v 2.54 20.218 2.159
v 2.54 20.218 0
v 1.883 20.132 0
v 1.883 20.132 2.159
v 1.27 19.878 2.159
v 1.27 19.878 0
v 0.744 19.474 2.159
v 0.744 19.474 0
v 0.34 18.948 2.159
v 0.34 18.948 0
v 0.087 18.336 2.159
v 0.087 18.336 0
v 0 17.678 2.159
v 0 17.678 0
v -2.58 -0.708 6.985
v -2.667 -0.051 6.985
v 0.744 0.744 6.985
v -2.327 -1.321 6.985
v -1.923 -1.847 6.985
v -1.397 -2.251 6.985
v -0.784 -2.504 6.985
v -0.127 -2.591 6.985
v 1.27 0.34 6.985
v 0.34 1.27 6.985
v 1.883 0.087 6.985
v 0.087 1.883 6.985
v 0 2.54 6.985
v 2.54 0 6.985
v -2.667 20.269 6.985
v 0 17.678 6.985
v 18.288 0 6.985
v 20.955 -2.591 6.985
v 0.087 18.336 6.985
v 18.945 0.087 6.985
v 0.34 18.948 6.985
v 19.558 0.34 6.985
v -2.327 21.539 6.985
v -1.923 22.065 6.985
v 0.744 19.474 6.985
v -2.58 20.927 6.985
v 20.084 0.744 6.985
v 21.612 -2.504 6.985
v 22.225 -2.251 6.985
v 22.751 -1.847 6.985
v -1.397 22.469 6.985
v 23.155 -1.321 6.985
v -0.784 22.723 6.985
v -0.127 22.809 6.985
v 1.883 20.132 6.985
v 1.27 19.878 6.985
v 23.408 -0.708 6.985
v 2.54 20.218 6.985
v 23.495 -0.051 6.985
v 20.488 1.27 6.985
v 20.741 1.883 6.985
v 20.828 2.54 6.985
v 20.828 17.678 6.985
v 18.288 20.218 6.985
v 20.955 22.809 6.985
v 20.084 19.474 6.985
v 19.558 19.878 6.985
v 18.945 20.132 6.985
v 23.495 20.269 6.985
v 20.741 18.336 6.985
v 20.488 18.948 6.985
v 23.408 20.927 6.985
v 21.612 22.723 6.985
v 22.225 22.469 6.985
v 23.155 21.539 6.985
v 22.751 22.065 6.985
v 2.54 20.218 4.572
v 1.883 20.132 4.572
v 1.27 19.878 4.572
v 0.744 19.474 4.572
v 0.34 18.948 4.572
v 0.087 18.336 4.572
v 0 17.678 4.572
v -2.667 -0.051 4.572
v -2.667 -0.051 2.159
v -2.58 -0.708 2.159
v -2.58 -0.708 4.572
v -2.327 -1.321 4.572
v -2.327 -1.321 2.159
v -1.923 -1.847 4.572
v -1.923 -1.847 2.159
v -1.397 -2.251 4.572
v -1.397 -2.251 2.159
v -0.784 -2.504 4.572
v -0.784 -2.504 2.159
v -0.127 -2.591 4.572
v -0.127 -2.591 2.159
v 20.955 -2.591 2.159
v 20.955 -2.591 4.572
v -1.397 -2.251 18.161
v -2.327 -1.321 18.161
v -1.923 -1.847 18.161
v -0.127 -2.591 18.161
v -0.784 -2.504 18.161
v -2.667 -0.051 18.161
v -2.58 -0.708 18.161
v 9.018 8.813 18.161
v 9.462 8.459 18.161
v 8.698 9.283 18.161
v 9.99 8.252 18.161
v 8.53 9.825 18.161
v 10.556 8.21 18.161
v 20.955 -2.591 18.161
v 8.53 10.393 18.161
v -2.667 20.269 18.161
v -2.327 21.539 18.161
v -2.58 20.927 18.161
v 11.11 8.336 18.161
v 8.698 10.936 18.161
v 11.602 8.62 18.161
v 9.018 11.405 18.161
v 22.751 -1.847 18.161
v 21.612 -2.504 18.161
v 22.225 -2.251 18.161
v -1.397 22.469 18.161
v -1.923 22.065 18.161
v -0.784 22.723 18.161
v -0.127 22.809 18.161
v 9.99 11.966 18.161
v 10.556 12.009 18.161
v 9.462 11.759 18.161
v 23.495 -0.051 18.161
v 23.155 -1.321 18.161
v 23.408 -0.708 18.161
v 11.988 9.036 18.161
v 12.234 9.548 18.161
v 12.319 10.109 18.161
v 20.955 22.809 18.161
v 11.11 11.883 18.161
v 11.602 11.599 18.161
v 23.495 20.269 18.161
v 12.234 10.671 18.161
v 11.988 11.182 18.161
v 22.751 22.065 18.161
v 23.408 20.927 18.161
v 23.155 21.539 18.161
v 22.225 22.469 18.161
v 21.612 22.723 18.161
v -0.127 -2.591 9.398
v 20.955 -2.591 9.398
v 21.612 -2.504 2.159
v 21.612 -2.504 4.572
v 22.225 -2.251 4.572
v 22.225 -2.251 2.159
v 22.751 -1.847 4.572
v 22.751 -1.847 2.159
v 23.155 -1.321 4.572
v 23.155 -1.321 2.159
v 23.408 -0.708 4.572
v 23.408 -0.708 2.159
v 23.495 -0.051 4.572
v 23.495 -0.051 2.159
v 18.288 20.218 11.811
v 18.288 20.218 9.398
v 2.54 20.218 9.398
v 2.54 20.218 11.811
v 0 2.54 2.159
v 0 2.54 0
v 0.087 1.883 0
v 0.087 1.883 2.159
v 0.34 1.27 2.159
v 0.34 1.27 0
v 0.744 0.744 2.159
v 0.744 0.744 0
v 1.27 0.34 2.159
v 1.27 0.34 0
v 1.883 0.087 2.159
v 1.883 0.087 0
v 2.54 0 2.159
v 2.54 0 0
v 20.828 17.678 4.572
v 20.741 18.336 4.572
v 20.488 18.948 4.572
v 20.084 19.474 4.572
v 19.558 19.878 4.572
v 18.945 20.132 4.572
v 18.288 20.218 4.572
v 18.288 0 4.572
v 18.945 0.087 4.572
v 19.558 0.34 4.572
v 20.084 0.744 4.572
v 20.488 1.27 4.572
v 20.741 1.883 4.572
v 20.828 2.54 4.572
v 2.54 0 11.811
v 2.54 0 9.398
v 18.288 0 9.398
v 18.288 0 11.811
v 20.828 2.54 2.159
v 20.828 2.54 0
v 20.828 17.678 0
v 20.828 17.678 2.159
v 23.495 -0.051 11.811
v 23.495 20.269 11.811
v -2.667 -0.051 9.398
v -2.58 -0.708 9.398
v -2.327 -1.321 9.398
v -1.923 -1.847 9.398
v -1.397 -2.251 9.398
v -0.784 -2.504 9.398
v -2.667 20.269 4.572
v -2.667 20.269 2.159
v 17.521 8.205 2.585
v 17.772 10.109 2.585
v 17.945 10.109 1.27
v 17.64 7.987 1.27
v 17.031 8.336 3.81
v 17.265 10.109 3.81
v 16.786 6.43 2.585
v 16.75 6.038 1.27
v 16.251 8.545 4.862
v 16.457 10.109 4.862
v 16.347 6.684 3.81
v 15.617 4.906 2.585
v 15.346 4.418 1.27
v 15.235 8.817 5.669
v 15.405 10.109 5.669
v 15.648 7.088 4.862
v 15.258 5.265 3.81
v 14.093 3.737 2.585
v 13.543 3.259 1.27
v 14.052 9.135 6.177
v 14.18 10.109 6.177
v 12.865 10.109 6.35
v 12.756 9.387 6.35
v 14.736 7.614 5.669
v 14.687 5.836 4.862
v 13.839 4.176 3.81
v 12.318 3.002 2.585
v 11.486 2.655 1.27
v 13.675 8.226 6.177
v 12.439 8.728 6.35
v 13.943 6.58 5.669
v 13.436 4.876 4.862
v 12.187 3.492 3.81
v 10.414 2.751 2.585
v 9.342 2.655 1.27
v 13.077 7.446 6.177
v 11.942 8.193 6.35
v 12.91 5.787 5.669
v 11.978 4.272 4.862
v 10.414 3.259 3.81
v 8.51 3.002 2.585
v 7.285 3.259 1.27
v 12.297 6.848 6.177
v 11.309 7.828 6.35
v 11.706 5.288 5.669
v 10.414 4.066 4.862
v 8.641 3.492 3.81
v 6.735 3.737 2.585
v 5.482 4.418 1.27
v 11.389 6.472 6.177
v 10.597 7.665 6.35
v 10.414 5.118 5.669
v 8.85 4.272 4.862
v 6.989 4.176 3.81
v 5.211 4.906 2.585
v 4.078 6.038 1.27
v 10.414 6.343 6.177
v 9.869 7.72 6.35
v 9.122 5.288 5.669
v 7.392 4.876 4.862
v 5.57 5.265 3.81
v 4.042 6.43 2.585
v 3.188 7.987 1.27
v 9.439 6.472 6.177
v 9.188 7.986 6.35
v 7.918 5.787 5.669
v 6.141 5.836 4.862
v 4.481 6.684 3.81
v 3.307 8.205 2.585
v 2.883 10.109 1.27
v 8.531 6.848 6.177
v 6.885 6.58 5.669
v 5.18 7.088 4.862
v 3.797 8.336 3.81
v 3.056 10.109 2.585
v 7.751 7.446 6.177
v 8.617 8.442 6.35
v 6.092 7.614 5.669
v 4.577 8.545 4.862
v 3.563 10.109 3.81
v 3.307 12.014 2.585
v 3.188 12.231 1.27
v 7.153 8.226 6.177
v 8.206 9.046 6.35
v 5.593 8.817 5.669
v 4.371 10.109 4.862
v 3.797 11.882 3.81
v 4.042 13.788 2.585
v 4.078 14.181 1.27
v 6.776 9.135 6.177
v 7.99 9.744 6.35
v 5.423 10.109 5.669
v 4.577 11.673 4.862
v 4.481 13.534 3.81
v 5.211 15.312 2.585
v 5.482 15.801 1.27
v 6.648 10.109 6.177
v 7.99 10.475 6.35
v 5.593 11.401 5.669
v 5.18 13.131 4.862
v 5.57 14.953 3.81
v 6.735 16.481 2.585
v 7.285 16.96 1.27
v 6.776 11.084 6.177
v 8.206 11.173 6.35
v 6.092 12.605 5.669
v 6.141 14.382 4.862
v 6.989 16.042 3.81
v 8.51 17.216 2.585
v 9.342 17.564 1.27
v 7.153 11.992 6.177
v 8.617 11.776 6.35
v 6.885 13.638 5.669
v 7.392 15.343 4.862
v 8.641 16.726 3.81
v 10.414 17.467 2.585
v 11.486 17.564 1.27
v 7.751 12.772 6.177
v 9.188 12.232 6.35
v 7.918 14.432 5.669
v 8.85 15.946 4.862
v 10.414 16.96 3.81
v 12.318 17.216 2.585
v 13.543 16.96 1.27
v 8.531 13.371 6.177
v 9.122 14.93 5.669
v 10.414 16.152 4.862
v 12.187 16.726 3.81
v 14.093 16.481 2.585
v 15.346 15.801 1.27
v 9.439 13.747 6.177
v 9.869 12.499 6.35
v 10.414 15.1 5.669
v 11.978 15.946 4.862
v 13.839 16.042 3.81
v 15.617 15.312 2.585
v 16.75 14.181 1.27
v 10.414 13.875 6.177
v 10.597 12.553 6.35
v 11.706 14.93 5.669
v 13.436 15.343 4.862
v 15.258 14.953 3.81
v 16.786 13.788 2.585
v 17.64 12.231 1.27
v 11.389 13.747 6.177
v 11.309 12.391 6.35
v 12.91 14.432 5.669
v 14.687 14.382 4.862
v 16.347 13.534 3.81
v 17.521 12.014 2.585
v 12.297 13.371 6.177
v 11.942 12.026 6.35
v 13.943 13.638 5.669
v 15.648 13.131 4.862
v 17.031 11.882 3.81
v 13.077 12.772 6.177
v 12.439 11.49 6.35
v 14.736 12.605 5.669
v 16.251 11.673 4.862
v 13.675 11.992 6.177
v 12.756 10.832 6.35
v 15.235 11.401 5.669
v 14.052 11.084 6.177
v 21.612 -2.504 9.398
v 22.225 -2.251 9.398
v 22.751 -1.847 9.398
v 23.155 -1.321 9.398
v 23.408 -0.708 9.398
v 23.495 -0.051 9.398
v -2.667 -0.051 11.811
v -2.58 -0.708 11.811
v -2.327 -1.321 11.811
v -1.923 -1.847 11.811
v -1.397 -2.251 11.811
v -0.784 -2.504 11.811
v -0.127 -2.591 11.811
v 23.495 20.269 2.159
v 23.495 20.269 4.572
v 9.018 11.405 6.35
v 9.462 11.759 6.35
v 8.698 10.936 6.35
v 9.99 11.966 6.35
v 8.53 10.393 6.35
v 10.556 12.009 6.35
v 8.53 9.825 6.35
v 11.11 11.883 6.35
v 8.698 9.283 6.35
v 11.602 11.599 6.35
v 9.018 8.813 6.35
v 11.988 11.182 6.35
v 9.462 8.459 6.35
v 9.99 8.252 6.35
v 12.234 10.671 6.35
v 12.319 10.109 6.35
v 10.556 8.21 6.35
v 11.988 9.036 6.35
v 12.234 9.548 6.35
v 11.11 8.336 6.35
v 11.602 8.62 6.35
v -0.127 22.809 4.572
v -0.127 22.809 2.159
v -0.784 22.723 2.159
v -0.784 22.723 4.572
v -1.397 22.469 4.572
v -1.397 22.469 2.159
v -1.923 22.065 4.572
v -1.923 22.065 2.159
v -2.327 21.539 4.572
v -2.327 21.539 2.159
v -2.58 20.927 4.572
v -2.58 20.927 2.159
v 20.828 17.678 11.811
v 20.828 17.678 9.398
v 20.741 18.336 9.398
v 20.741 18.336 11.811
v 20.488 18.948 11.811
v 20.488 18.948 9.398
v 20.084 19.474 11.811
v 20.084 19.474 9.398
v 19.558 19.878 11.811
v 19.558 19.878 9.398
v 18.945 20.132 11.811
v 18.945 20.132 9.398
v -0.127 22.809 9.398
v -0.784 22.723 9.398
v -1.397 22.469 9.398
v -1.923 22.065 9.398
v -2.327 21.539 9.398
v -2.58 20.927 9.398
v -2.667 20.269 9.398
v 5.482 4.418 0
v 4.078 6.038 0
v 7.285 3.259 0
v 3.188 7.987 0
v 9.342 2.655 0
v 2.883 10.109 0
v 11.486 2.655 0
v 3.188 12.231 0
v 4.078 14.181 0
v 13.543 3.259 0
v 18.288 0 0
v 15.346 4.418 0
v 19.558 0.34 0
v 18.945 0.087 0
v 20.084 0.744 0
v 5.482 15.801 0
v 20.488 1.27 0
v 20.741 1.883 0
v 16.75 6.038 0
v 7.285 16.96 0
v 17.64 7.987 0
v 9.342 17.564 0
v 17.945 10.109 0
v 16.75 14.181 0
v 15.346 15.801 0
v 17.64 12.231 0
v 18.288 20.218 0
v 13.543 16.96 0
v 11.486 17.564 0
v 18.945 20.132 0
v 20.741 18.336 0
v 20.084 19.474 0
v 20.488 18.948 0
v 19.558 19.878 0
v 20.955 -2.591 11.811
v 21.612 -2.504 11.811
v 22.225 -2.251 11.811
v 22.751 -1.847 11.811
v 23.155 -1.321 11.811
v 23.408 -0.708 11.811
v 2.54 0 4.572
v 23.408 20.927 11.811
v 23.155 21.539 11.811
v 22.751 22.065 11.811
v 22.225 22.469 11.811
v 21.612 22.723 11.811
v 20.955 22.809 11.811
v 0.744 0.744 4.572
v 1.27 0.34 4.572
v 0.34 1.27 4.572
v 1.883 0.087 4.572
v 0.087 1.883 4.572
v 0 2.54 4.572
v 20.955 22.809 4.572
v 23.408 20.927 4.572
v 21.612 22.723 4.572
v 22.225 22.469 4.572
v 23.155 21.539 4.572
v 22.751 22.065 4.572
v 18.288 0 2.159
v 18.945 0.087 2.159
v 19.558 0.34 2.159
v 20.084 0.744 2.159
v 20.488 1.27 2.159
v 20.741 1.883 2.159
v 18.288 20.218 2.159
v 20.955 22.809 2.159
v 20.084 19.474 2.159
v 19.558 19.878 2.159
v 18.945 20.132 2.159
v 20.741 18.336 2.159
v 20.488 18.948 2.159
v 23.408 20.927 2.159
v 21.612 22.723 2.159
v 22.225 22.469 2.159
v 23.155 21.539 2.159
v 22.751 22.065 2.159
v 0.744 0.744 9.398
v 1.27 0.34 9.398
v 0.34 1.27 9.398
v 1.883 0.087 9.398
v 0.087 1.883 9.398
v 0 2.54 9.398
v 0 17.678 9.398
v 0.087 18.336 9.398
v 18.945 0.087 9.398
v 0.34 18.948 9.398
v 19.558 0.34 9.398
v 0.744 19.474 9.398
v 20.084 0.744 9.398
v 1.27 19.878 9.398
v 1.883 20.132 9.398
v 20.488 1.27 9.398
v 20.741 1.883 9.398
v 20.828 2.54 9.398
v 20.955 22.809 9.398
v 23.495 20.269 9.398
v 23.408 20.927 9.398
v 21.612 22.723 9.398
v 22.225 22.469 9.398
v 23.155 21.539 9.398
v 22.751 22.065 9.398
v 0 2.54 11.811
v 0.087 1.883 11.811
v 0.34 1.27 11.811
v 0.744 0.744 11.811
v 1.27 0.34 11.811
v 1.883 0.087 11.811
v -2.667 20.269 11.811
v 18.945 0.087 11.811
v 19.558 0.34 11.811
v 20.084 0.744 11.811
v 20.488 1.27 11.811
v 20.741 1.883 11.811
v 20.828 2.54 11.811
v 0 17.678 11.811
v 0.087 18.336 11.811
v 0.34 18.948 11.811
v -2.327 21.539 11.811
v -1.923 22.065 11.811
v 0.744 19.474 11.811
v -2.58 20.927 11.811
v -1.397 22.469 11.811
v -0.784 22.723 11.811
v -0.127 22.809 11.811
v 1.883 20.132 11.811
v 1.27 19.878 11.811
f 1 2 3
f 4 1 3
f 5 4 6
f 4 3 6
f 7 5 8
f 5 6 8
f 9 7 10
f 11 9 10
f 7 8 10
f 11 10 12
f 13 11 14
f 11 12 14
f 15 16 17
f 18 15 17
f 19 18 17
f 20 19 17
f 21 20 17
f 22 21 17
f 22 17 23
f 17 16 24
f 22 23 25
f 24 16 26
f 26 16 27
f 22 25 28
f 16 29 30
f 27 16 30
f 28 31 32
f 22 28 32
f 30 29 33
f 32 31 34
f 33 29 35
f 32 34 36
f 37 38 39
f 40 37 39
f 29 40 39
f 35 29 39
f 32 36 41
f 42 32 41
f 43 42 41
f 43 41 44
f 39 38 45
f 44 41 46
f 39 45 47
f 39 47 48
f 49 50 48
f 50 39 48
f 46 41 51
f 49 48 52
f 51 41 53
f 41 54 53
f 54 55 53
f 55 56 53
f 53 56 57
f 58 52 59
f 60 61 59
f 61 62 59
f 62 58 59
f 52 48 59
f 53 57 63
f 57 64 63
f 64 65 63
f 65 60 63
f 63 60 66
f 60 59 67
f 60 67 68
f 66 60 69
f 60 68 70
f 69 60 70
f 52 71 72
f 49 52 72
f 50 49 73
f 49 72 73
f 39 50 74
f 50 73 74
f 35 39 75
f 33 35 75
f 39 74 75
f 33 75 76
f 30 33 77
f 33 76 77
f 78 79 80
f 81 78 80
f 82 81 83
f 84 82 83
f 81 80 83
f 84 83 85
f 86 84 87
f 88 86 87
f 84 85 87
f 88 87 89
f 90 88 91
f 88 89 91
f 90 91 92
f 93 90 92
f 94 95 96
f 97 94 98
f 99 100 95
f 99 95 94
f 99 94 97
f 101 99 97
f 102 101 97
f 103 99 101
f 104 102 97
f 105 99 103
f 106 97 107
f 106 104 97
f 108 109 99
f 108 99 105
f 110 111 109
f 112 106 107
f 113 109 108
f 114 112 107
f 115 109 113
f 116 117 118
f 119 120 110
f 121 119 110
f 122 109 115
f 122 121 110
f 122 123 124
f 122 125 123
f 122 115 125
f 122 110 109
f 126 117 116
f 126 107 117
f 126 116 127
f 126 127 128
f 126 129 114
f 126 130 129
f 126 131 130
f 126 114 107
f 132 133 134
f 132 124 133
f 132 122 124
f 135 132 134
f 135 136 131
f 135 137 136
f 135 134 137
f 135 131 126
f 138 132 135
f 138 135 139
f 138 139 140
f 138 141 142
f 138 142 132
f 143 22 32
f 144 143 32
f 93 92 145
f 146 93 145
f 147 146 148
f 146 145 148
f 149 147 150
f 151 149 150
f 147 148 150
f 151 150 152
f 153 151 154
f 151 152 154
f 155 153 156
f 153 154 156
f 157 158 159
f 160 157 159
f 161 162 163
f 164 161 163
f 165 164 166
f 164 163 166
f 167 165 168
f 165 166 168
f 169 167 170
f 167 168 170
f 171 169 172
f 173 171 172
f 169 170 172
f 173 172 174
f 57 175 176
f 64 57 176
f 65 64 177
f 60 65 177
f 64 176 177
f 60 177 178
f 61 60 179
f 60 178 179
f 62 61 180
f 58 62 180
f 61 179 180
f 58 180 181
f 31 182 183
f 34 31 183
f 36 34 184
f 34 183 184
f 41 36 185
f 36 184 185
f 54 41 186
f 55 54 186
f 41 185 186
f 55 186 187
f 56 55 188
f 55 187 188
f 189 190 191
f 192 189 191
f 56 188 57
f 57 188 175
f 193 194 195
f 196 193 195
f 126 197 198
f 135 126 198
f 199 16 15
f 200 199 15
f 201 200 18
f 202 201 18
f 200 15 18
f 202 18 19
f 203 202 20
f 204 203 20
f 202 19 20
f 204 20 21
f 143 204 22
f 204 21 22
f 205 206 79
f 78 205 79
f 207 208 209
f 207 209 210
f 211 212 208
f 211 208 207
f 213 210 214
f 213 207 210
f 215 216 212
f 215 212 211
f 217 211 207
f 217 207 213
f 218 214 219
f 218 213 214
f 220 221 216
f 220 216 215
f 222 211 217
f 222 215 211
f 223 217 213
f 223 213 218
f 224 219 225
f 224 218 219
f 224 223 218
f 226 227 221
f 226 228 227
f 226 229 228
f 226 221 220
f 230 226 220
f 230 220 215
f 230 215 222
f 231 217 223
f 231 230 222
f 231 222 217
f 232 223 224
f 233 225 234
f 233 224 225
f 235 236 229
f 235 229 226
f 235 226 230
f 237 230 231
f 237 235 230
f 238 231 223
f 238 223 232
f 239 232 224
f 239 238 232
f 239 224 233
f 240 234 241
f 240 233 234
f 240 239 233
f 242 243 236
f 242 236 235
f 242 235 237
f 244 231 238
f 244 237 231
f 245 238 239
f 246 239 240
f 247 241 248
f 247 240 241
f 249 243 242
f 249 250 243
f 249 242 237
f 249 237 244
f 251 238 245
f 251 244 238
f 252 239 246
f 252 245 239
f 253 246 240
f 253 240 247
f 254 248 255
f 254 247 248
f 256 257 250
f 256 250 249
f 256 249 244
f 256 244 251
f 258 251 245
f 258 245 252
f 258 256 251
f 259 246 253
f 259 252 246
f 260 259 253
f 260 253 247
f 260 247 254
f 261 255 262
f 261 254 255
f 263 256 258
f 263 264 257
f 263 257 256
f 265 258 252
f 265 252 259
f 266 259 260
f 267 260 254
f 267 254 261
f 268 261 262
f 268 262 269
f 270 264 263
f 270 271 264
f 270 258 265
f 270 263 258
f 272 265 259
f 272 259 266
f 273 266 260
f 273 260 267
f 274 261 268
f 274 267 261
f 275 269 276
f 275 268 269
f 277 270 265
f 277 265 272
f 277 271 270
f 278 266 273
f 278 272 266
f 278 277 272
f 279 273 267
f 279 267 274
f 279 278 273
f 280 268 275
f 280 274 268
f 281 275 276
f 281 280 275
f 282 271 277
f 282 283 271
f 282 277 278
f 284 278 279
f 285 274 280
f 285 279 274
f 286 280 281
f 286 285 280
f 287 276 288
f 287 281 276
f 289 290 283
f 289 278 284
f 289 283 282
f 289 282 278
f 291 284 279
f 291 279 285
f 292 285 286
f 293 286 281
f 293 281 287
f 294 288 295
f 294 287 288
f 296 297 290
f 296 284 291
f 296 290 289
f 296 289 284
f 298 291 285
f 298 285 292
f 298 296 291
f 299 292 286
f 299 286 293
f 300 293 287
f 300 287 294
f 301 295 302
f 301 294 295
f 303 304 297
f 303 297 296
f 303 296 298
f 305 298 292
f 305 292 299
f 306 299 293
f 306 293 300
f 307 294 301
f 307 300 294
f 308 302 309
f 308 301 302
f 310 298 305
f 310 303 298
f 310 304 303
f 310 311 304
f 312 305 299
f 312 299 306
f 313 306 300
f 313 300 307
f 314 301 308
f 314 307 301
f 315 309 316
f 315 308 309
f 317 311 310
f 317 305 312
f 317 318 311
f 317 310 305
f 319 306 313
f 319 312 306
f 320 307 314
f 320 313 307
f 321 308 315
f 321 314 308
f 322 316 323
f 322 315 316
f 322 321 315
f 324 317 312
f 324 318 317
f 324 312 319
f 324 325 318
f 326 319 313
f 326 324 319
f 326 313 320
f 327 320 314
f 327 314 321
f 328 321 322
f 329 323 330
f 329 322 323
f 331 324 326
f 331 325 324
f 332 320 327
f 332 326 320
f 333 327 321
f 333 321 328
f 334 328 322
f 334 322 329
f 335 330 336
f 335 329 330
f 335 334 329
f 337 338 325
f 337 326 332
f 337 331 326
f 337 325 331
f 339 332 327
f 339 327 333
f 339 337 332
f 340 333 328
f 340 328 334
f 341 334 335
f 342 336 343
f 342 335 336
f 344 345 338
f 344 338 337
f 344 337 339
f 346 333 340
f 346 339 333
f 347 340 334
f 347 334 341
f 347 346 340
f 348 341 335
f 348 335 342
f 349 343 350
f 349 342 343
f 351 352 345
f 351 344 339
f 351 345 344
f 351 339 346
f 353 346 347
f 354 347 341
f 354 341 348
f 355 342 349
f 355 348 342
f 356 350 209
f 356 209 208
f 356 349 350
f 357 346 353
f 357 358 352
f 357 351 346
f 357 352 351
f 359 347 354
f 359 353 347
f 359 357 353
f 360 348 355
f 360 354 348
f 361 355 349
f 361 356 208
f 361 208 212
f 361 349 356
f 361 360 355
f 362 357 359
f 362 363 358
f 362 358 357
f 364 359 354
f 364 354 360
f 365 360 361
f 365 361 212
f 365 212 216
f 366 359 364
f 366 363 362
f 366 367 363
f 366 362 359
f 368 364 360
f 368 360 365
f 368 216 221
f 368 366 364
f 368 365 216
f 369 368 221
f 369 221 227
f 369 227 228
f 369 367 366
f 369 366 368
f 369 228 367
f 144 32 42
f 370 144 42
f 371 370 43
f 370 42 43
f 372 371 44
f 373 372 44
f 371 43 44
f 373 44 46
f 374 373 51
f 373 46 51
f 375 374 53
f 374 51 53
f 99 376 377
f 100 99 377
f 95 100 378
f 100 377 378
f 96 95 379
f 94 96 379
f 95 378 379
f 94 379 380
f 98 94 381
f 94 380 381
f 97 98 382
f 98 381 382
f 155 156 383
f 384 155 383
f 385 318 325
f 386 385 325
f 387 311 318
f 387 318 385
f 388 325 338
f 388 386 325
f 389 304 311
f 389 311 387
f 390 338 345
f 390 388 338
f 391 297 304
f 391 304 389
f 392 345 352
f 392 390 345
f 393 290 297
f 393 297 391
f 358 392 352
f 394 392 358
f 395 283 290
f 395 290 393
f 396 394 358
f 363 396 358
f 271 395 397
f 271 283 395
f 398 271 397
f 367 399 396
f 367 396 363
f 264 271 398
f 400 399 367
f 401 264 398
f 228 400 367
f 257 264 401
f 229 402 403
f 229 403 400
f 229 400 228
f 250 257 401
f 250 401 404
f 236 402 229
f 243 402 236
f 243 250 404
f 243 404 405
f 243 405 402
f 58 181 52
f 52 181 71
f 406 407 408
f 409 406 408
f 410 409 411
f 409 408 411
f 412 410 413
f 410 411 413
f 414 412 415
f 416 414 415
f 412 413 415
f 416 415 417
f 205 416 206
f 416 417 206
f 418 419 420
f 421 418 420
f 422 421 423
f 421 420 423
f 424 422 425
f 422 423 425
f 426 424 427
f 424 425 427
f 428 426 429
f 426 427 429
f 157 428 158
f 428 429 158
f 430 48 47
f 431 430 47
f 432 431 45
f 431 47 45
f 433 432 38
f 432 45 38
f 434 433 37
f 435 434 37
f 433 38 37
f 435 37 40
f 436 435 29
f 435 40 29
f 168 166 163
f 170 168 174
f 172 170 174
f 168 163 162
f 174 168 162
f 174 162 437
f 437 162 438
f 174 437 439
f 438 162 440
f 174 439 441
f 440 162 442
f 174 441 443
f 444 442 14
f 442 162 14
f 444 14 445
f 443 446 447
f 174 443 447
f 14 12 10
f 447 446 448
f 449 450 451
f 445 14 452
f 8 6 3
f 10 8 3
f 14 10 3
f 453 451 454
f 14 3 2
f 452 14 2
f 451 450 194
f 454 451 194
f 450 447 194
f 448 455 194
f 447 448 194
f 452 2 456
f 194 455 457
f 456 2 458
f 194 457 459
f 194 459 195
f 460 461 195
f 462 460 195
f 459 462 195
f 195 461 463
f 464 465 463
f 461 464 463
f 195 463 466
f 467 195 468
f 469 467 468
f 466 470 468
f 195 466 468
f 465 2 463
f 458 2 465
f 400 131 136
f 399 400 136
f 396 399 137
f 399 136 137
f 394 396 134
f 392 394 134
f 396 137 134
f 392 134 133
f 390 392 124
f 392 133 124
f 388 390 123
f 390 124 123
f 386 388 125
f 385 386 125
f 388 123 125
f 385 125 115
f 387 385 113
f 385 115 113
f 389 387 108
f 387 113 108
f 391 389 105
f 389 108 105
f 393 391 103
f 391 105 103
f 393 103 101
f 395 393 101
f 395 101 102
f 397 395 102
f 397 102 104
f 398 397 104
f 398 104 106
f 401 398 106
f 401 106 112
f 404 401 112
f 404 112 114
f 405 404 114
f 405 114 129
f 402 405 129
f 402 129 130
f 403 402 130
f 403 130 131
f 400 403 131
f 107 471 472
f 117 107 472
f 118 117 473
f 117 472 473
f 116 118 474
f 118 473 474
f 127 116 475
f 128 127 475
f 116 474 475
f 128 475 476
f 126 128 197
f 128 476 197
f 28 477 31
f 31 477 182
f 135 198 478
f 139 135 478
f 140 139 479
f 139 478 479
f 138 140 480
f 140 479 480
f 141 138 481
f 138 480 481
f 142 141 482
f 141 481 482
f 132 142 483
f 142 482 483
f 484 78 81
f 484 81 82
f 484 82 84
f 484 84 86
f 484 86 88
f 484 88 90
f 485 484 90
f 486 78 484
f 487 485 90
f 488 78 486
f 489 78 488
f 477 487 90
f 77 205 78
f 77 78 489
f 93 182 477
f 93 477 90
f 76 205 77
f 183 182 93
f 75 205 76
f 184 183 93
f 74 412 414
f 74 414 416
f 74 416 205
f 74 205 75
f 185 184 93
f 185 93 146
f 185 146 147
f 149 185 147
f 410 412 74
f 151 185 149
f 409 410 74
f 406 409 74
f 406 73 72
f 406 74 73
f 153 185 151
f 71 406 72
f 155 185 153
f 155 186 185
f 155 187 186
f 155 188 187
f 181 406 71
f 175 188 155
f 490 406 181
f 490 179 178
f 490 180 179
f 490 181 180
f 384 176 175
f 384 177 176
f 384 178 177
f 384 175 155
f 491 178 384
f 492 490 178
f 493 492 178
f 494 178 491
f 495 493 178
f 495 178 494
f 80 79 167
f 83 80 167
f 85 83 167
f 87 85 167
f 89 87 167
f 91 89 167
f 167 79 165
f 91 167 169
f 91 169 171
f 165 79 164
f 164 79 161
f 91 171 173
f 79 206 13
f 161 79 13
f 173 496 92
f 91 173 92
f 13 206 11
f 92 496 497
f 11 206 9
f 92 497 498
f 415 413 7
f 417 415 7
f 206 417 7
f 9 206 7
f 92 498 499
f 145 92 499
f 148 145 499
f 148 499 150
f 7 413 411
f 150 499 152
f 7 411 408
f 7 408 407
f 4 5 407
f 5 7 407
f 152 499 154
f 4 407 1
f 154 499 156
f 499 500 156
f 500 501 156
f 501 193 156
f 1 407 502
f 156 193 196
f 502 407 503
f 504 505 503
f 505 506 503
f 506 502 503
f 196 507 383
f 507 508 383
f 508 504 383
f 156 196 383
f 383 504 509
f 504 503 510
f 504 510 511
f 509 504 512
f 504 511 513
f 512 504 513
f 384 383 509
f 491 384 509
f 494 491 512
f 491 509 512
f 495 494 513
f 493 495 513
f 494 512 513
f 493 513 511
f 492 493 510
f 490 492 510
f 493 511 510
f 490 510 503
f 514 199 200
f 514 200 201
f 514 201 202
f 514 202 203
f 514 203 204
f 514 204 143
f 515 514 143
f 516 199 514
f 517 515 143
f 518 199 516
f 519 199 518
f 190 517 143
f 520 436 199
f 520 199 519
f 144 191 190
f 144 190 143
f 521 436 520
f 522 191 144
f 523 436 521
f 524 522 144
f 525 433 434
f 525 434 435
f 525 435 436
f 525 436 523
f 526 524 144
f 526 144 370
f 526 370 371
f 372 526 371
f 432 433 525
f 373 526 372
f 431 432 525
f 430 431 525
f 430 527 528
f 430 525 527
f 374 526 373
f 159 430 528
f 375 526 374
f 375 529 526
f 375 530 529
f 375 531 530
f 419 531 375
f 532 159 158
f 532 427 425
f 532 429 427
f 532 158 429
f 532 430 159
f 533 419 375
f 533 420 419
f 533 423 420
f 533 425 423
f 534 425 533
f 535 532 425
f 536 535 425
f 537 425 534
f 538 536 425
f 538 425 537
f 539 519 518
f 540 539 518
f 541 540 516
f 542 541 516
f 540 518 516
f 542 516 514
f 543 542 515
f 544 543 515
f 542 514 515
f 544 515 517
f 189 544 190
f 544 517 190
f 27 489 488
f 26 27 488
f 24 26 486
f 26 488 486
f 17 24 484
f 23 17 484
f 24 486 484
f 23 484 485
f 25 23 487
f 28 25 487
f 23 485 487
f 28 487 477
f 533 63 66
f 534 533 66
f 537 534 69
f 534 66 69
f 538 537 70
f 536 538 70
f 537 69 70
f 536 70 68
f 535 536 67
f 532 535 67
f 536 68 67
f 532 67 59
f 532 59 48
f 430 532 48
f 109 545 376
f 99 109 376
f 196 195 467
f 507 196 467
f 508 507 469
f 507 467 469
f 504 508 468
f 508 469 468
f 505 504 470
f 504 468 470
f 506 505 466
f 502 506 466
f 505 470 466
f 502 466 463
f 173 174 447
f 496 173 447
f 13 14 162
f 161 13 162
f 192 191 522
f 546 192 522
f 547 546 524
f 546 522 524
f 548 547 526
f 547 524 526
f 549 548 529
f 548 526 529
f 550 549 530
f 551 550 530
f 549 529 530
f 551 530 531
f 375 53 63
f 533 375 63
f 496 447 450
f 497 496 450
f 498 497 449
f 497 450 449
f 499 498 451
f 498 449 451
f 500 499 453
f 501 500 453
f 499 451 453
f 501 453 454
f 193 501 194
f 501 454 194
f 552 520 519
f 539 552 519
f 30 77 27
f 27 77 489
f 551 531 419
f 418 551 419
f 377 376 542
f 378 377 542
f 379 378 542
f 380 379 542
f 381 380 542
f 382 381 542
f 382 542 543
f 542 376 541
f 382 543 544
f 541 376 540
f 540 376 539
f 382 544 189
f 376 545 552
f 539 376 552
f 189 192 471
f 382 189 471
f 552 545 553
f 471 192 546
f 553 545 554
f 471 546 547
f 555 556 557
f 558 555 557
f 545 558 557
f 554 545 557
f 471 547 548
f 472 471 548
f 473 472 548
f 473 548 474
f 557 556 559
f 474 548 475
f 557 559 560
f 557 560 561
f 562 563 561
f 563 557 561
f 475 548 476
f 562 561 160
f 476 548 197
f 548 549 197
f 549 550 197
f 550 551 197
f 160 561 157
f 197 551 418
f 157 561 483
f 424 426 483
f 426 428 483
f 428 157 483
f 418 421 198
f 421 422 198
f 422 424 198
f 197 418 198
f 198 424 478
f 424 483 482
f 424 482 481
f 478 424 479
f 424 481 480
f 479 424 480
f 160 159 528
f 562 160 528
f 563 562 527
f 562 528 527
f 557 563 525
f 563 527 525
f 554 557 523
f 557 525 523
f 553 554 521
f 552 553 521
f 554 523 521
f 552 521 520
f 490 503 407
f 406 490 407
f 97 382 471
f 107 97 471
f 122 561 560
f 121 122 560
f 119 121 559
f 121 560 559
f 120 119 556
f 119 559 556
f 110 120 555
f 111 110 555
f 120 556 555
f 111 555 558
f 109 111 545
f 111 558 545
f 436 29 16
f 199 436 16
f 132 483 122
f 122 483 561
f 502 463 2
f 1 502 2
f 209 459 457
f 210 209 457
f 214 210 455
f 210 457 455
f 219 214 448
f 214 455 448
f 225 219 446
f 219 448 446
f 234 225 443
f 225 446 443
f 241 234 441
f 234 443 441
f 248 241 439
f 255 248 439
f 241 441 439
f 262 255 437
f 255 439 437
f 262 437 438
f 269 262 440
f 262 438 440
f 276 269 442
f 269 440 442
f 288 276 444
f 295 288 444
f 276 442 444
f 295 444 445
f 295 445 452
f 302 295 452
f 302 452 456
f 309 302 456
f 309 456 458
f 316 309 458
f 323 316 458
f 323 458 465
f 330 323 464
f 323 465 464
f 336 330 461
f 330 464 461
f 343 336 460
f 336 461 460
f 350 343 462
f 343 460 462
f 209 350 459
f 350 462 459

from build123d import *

# Parameters (mm, degrees)
F1_DEPTH  = 2.159
F3_DEPTH  = 2.413
F5_DEPTH  = 2.413
F7_DEPTH  = 2.413
F9_DEPTH  = 2.413
F11_DEPTH = 6.35
F14_R     = 7.5311
F15_DEPTH = 6.35
F16_R     = 5.08
F17_R     = 1.905
F18_DEPTH = 18.162


with BuildPart() as f1:
    # F0 (on Top) → F1 (new body)
    with BuildSketch(Plane.XY):
        with BuildLine():
            Line((18.288, 20.2184), (2.54, 20.2184))
            ThreePointArc((2.54, 20.2184), (0.743949, 19.474451), (0, 17.6784))
            Line((0, 17.6784), (0, 2.54))
            ThreePointArc((0, 2.54), (0.743949, 0.743949), (2.54, 0))
            Line((2.54, 0), (18.288, 0))
            ThreePointArc((18.288, 0), (20.084051, 0.743949), (20.828, 2.54))
            Line((20.828, 2.54), (20.828, 17.6784))
            ThreePointArc((20.828, 17.6784), (20.084051, 19.474451), (18.288, 20.2184))
        make_face()
    extrude(amount=F1_DEPTH)

    # F2 (on face) → F3 (join)
    with BuildSketch(Plane.XY.offset(2.159)):
        with BuildLine():
            Line((20.955, 22.8092), (-0.127, 22.8092))
            ThreePointArc((-0.127, 22.8092), (-1.923051, 22.065251), (-2.667, 20.2692))
            Line((-2.667, 20.2692), (-2.667, -0.0508))
            ThreePointArc((-2.667, -0.0508), (-1.923051, -1.846851), (-0.127, -2.5908))
            Line((-0.127, -2.5908), (20.955, -2.5908))
            ThreePointArc((20.955, -2.5908), (22.751051, -1.846851), (23.495, -0.0508))
            Line((23.495, -0.0508), (23.495, 20.2692))
            ThreePointArc((23.495, 20.2692), (22.751051, 22.065251), (20.955, 22.8092))
        make_face()
    extrude(amount=F3_DEPTH)



with BuildPart() as f5:
    # F4 (on face) → F5 (new body)
    with BuildSketch(Plane.XY.offset(9.398)):
        with BuildLine():
            ThreePointArc((0, 2.54), (0.743949, 0.743949), (2.54, 0))
            Line((2.54, 0), (18.288, 0))
            ThreePointArc((18.288, 0), (20.084051, 0.743949), (20.828, 2.54))
            Line((20.828, 2.54), (20.828, 17.6784))
            ThreePointArc((20.828, 17.6784), (20.084051, 19.474451), (18.288, 20.2184))
            Line((18.288, 20.2184), (2.54, 20.2184))
            ThreePointArc((2.54, 20.2184), (0.743949, 19.474451), (0, 17.6784))
            Line((0, 17.6784), (0, 2.54))
        make_face()
    extrude(amount=F5_DEPTH)

    # F6 (on face) → F7 (join)
    with BuildSketch(Plane.XY.offset(6.985)):
        with BuildLine():
            Line((-2.667, 20.2692), (-2.667, -0.0508))
            ThreePointArc((-2.667, -0.0508), (-1.923051, -1.846851), (-0.127, -2.5908))
            Line((-0.127, -2.5908), (20.955, -2.5908))
            ThreePointArc((20.955, -2.5908), (22.751051, -1.846851), (23.495, -0.0508))
            Line((23.495, -0.0508), (23.495, 20.2692))
            ThreePointArc((23.495, 20.2692), (22.751051, 22.065251), (20.955, 22.8092))
            Line((20.955, 22.8092), (-0.127, 22.8092))
            ThreePointArc((-0.127, 22.8092), (-1.923051, 22.065251), (-2.667, 20.2692))
        make_face()
    extrude(amount=F7_DEPTH)


with BuildPart() as f1_1:
    add(f1.part)

    add(f5.part)  # F9 merges F5
    # F8 (on face) → F9 (join)
    with BuildSketch(Plane.XY.offset(4.572)):
        with BuildLine():
            ThreePointArc((0, 2.54), (0.743949, 0.743949), (2.54, 0))
            Line((2.54, 0), (18.288, 0))
            ThreePointArc((18.288, 0), (20.084051, 0.743949), (20.828, 2.54))
            Line((20.828, 2.54), (20.828, 17.6784))
            ThreePointArc((20.828, 17.6784), (20.084051, 19.474451), (18.288, 20.2184))
            Line((18.288, 20.2184), (2.54, 20.2184))
            ThreePointArc((2.54, 20.2184), (0.743949, 19.474451), (0, 17.6784))
            Line((0, 17.6784), (0, 2.54))
        make_face()
    extrude(amount=F9_DEPTH)

    # F10 (on face) → F11 (join)
    with BuildSketch(Plane.XY.offset(11.811)):
        with BuildLine():
            Line((20.955, 22.8092), (-0.127, 22.8092))
            ThreePointArc((-0.127, 22.8092), (-1.923051, 22.065251), (-2.667, 20.2692))
            Line((-2.667, 20.2692), (-2.667, -0.0508))
            ThreePointArc((-2.667, -0.0508), (-1.923051, -1.846851), (-0.127, -2.5908))
            Line((-0.127, -2.5908), (20.955, -2.5908))
            ThreePointArc((20.955, -2.5908), (22.751051, -1.846851), (23.495, -0.0508))
            Line((23.495, -0.0508), (23.495, 20.2692))
            ThreePointArc((23.495, 20.2692), (22.751051, 22.065251), (20.955, 22.8092))
        make_face()
    extrude(amount=F11_DEPTH)

    # F14 (on face) → F15 (cut)
    with BuildSketch(Plane(origin=(0, 0, 0), x_dir=(1, 0, 0), z_dir=(0, 0, -1))):
        with Locations((10.414, -10.1092)):
            Circle(F14_R)
    extrude(amount=-F15_DEPTH, mode=Mode.SUBTRACT)

    # F16
    f16_edges = [f1_1.edges().sort_by_distance(p)[0] for p in [
        (2.8829, 10.1092, 6.35),
    ]]
    fillet(f16_edges, radius=F16_R)

    # F17 (on face) → F18 (cut, through all)
    with BuildSketch(Plane.XY.offset(18.161)):
        with Locations((10.414, 10.1092)):
            Circle(F17_R)
    extrude(amount=-F18_DEPTH, mode=Mode.SUBTRACT)


solid = f1_1.part
